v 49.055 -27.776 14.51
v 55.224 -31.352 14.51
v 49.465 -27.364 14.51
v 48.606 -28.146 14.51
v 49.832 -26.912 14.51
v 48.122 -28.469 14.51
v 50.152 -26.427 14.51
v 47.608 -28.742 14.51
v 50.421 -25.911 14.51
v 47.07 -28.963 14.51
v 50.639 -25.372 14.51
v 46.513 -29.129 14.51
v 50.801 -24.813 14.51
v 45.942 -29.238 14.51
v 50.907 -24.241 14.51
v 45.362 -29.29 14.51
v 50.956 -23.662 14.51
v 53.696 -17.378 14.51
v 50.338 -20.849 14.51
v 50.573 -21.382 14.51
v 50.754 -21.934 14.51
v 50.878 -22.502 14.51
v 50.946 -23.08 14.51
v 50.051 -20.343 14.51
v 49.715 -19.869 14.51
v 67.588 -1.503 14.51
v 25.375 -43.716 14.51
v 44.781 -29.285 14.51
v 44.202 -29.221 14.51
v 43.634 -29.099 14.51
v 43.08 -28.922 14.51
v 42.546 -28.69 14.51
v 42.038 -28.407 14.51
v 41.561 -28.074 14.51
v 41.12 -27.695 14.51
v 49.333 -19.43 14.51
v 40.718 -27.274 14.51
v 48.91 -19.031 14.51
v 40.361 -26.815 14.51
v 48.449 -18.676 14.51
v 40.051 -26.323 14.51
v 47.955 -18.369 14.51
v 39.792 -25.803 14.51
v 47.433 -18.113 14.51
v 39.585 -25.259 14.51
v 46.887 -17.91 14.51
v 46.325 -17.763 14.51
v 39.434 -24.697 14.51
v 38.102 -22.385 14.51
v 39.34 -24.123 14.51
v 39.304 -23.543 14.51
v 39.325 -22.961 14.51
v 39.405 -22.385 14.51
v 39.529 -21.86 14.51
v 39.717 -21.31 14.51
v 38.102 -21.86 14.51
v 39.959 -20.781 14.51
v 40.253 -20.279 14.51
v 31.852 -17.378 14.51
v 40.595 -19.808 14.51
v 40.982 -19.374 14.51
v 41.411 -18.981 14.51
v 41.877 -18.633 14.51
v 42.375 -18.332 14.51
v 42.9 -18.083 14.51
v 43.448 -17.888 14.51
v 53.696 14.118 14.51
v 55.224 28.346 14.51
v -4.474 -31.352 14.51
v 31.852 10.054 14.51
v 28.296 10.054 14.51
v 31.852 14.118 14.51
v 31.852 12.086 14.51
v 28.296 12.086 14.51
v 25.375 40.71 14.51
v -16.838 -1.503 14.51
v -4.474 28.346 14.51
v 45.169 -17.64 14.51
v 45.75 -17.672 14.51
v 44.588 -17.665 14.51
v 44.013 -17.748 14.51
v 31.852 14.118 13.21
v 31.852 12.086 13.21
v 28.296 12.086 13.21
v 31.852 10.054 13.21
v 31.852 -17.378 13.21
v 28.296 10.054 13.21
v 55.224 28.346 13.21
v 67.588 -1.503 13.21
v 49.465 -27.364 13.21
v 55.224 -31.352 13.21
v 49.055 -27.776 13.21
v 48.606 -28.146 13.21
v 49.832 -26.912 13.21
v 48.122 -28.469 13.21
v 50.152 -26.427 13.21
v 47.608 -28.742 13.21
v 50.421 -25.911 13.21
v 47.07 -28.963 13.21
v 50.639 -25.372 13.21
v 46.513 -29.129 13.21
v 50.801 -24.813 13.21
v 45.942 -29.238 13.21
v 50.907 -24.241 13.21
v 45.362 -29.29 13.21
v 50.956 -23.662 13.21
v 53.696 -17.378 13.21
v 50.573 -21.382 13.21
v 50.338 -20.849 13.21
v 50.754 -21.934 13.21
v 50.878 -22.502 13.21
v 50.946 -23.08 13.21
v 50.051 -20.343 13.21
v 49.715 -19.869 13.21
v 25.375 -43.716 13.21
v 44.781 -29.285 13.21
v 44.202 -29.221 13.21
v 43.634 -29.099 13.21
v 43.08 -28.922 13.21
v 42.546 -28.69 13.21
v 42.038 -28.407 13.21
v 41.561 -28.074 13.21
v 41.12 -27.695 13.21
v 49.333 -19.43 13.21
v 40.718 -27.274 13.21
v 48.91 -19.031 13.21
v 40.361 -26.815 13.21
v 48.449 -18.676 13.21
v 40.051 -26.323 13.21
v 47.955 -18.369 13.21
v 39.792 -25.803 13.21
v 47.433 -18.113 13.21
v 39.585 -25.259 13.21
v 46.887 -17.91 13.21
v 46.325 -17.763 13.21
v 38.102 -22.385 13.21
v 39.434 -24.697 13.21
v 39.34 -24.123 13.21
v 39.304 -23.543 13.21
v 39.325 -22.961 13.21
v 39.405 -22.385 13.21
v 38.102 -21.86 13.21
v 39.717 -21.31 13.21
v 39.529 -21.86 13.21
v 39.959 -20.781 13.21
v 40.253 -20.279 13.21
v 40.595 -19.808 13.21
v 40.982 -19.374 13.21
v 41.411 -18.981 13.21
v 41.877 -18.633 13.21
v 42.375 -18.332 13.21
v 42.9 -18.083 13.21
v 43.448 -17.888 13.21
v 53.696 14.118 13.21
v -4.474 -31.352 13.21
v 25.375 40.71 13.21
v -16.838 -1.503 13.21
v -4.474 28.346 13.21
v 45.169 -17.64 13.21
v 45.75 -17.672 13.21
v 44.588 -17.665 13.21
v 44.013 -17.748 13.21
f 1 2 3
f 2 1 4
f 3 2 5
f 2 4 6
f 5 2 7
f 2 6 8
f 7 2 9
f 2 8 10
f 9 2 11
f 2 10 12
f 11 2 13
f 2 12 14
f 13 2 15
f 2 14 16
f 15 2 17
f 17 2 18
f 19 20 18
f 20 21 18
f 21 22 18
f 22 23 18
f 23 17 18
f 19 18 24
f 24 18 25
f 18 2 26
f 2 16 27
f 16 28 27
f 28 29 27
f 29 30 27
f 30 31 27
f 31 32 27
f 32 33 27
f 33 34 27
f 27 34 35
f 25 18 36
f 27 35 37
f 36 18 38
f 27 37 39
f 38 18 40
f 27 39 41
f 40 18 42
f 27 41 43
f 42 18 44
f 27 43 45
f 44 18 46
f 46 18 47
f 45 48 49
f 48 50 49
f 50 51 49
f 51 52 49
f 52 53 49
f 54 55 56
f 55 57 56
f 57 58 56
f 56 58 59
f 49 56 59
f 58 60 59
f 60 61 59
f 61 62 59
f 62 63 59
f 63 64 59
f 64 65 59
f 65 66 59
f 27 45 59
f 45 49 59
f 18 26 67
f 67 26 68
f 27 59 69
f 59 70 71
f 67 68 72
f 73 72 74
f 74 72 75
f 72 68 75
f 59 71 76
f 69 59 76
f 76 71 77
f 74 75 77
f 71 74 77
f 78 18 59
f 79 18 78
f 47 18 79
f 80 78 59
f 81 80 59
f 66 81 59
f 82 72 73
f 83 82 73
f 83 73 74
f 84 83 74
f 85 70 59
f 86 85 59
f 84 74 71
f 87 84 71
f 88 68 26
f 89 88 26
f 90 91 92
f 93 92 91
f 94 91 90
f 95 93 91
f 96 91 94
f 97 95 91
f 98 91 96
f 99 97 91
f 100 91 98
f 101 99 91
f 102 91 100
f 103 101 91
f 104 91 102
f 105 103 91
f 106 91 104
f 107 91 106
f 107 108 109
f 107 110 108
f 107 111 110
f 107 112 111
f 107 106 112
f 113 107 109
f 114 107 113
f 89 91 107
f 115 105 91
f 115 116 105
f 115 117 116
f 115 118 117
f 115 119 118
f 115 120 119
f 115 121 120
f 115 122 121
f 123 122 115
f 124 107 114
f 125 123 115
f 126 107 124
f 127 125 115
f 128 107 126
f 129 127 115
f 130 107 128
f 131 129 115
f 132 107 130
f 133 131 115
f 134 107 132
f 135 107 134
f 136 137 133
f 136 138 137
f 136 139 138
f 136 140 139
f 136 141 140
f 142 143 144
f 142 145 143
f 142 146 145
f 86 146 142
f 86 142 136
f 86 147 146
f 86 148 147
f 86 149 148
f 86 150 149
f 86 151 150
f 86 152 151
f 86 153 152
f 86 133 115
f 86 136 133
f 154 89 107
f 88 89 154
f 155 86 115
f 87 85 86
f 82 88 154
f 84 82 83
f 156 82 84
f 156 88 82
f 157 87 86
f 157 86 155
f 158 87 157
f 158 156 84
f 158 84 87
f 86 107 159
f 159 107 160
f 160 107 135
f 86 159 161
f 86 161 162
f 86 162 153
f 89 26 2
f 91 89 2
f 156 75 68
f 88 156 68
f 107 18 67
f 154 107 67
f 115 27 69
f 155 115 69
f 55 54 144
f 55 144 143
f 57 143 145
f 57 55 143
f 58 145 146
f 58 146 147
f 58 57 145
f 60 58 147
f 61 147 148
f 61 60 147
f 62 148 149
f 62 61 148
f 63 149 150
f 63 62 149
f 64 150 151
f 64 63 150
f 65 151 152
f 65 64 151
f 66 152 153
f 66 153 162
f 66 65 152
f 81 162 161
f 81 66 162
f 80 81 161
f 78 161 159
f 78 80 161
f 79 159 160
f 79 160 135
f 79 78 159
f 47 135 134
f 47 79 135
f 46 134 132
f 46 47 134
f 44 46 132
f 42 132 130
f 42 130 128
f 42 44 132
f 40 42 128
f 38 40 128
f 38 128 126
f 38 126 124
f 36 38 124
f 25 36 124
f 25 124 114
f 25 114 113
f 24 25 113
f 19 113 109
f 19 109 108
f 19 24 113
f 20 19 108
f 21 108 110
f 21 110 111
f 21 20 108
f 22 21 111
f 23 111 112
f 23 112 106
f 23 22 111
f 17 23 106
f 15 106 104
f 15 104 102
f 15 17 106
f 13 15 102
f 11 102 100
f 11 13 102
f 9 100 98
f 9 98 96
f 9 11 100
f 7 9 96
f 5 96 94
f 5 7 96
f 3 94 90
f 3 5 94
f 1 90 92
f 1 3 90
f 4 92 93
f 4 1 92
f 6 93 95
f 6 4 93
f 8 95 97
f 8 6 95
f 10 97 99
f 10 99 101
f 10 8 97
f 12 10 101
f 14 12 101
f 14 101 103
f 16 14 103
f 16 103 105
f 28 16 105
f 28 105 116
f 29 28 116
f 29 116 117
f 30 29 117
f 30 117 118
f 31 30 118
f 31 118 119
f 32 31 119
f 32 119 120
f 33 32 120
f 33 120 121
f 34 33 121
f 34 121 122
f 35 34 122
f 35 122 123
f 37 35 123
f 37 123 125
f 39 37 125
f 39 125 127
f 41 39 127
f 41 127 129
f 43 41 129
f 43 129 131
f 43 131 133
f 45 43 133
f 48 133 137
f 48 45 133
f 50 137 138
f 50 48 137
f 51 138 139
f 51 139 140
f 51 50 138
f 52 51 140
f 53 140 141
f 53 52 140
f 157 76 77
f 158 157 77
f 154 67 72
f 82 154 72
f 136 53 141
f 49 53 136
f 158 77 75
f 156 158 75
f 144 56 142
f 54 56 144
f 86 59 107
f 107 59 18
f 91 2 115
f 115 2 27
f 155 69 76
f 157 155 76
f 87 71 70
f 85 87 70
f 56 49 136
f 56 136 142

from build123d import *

# Parameters (mm, degrees)
BOSS_EXTRU_2_DEPTH = 1.3


with BuildPart() as part:
    # Esquisse2 → Boss.-Extru.2 (new body)
    with BuildSketch(Plane(origin=(0, 0, 14.509966587), x_dir=(-1, 0, 0), z_dir=(0, 0, -1))):
        Polygon((-55.223785445, -31.352276986), (-25.374778792, -43.716279214), (4.474220231, -31.352276986), (16.838222459, -1.503277963), (4.474220231, 28.345721061), (-25.374778792, 40.709719474), (-55.223785445, 28.345721061), (-67.587783858, -1.503277963), align=None)
        Polygon((-31.851776167, 10.053721244), (-31.851776167, -17.378277963), (-53.695785567, -17.378277963), (-53.695785567, 14.117724234), (-31.851776167, 14.117724234), (-31.851776167, 12.085718924), (-28.295776412, 12.085718924), (-28.295776412, 10.053721244), align=None, mode=Mode.SUBTRACT)
        with BuildLine():
            Line((-38.101776167, -21.860276406), (-39.529126769, -21.860276406))
            ThreePointArc((-39.529126769, -21.860276406), (-50.80118854, -24.813312469), (-39.4045428, -22.385089985))
            Line((-39.4045428, -22.385089985), (-38.101776167, -22.385089985))
            Line((-38.101776167, -22.385089985), (-38.101776167, -21.860276406))
        make_face(mode=Mode.SUBTRACT)
    extrude(amount=BOSS_EXTRU_2_DEPTH)


solid = part.part
